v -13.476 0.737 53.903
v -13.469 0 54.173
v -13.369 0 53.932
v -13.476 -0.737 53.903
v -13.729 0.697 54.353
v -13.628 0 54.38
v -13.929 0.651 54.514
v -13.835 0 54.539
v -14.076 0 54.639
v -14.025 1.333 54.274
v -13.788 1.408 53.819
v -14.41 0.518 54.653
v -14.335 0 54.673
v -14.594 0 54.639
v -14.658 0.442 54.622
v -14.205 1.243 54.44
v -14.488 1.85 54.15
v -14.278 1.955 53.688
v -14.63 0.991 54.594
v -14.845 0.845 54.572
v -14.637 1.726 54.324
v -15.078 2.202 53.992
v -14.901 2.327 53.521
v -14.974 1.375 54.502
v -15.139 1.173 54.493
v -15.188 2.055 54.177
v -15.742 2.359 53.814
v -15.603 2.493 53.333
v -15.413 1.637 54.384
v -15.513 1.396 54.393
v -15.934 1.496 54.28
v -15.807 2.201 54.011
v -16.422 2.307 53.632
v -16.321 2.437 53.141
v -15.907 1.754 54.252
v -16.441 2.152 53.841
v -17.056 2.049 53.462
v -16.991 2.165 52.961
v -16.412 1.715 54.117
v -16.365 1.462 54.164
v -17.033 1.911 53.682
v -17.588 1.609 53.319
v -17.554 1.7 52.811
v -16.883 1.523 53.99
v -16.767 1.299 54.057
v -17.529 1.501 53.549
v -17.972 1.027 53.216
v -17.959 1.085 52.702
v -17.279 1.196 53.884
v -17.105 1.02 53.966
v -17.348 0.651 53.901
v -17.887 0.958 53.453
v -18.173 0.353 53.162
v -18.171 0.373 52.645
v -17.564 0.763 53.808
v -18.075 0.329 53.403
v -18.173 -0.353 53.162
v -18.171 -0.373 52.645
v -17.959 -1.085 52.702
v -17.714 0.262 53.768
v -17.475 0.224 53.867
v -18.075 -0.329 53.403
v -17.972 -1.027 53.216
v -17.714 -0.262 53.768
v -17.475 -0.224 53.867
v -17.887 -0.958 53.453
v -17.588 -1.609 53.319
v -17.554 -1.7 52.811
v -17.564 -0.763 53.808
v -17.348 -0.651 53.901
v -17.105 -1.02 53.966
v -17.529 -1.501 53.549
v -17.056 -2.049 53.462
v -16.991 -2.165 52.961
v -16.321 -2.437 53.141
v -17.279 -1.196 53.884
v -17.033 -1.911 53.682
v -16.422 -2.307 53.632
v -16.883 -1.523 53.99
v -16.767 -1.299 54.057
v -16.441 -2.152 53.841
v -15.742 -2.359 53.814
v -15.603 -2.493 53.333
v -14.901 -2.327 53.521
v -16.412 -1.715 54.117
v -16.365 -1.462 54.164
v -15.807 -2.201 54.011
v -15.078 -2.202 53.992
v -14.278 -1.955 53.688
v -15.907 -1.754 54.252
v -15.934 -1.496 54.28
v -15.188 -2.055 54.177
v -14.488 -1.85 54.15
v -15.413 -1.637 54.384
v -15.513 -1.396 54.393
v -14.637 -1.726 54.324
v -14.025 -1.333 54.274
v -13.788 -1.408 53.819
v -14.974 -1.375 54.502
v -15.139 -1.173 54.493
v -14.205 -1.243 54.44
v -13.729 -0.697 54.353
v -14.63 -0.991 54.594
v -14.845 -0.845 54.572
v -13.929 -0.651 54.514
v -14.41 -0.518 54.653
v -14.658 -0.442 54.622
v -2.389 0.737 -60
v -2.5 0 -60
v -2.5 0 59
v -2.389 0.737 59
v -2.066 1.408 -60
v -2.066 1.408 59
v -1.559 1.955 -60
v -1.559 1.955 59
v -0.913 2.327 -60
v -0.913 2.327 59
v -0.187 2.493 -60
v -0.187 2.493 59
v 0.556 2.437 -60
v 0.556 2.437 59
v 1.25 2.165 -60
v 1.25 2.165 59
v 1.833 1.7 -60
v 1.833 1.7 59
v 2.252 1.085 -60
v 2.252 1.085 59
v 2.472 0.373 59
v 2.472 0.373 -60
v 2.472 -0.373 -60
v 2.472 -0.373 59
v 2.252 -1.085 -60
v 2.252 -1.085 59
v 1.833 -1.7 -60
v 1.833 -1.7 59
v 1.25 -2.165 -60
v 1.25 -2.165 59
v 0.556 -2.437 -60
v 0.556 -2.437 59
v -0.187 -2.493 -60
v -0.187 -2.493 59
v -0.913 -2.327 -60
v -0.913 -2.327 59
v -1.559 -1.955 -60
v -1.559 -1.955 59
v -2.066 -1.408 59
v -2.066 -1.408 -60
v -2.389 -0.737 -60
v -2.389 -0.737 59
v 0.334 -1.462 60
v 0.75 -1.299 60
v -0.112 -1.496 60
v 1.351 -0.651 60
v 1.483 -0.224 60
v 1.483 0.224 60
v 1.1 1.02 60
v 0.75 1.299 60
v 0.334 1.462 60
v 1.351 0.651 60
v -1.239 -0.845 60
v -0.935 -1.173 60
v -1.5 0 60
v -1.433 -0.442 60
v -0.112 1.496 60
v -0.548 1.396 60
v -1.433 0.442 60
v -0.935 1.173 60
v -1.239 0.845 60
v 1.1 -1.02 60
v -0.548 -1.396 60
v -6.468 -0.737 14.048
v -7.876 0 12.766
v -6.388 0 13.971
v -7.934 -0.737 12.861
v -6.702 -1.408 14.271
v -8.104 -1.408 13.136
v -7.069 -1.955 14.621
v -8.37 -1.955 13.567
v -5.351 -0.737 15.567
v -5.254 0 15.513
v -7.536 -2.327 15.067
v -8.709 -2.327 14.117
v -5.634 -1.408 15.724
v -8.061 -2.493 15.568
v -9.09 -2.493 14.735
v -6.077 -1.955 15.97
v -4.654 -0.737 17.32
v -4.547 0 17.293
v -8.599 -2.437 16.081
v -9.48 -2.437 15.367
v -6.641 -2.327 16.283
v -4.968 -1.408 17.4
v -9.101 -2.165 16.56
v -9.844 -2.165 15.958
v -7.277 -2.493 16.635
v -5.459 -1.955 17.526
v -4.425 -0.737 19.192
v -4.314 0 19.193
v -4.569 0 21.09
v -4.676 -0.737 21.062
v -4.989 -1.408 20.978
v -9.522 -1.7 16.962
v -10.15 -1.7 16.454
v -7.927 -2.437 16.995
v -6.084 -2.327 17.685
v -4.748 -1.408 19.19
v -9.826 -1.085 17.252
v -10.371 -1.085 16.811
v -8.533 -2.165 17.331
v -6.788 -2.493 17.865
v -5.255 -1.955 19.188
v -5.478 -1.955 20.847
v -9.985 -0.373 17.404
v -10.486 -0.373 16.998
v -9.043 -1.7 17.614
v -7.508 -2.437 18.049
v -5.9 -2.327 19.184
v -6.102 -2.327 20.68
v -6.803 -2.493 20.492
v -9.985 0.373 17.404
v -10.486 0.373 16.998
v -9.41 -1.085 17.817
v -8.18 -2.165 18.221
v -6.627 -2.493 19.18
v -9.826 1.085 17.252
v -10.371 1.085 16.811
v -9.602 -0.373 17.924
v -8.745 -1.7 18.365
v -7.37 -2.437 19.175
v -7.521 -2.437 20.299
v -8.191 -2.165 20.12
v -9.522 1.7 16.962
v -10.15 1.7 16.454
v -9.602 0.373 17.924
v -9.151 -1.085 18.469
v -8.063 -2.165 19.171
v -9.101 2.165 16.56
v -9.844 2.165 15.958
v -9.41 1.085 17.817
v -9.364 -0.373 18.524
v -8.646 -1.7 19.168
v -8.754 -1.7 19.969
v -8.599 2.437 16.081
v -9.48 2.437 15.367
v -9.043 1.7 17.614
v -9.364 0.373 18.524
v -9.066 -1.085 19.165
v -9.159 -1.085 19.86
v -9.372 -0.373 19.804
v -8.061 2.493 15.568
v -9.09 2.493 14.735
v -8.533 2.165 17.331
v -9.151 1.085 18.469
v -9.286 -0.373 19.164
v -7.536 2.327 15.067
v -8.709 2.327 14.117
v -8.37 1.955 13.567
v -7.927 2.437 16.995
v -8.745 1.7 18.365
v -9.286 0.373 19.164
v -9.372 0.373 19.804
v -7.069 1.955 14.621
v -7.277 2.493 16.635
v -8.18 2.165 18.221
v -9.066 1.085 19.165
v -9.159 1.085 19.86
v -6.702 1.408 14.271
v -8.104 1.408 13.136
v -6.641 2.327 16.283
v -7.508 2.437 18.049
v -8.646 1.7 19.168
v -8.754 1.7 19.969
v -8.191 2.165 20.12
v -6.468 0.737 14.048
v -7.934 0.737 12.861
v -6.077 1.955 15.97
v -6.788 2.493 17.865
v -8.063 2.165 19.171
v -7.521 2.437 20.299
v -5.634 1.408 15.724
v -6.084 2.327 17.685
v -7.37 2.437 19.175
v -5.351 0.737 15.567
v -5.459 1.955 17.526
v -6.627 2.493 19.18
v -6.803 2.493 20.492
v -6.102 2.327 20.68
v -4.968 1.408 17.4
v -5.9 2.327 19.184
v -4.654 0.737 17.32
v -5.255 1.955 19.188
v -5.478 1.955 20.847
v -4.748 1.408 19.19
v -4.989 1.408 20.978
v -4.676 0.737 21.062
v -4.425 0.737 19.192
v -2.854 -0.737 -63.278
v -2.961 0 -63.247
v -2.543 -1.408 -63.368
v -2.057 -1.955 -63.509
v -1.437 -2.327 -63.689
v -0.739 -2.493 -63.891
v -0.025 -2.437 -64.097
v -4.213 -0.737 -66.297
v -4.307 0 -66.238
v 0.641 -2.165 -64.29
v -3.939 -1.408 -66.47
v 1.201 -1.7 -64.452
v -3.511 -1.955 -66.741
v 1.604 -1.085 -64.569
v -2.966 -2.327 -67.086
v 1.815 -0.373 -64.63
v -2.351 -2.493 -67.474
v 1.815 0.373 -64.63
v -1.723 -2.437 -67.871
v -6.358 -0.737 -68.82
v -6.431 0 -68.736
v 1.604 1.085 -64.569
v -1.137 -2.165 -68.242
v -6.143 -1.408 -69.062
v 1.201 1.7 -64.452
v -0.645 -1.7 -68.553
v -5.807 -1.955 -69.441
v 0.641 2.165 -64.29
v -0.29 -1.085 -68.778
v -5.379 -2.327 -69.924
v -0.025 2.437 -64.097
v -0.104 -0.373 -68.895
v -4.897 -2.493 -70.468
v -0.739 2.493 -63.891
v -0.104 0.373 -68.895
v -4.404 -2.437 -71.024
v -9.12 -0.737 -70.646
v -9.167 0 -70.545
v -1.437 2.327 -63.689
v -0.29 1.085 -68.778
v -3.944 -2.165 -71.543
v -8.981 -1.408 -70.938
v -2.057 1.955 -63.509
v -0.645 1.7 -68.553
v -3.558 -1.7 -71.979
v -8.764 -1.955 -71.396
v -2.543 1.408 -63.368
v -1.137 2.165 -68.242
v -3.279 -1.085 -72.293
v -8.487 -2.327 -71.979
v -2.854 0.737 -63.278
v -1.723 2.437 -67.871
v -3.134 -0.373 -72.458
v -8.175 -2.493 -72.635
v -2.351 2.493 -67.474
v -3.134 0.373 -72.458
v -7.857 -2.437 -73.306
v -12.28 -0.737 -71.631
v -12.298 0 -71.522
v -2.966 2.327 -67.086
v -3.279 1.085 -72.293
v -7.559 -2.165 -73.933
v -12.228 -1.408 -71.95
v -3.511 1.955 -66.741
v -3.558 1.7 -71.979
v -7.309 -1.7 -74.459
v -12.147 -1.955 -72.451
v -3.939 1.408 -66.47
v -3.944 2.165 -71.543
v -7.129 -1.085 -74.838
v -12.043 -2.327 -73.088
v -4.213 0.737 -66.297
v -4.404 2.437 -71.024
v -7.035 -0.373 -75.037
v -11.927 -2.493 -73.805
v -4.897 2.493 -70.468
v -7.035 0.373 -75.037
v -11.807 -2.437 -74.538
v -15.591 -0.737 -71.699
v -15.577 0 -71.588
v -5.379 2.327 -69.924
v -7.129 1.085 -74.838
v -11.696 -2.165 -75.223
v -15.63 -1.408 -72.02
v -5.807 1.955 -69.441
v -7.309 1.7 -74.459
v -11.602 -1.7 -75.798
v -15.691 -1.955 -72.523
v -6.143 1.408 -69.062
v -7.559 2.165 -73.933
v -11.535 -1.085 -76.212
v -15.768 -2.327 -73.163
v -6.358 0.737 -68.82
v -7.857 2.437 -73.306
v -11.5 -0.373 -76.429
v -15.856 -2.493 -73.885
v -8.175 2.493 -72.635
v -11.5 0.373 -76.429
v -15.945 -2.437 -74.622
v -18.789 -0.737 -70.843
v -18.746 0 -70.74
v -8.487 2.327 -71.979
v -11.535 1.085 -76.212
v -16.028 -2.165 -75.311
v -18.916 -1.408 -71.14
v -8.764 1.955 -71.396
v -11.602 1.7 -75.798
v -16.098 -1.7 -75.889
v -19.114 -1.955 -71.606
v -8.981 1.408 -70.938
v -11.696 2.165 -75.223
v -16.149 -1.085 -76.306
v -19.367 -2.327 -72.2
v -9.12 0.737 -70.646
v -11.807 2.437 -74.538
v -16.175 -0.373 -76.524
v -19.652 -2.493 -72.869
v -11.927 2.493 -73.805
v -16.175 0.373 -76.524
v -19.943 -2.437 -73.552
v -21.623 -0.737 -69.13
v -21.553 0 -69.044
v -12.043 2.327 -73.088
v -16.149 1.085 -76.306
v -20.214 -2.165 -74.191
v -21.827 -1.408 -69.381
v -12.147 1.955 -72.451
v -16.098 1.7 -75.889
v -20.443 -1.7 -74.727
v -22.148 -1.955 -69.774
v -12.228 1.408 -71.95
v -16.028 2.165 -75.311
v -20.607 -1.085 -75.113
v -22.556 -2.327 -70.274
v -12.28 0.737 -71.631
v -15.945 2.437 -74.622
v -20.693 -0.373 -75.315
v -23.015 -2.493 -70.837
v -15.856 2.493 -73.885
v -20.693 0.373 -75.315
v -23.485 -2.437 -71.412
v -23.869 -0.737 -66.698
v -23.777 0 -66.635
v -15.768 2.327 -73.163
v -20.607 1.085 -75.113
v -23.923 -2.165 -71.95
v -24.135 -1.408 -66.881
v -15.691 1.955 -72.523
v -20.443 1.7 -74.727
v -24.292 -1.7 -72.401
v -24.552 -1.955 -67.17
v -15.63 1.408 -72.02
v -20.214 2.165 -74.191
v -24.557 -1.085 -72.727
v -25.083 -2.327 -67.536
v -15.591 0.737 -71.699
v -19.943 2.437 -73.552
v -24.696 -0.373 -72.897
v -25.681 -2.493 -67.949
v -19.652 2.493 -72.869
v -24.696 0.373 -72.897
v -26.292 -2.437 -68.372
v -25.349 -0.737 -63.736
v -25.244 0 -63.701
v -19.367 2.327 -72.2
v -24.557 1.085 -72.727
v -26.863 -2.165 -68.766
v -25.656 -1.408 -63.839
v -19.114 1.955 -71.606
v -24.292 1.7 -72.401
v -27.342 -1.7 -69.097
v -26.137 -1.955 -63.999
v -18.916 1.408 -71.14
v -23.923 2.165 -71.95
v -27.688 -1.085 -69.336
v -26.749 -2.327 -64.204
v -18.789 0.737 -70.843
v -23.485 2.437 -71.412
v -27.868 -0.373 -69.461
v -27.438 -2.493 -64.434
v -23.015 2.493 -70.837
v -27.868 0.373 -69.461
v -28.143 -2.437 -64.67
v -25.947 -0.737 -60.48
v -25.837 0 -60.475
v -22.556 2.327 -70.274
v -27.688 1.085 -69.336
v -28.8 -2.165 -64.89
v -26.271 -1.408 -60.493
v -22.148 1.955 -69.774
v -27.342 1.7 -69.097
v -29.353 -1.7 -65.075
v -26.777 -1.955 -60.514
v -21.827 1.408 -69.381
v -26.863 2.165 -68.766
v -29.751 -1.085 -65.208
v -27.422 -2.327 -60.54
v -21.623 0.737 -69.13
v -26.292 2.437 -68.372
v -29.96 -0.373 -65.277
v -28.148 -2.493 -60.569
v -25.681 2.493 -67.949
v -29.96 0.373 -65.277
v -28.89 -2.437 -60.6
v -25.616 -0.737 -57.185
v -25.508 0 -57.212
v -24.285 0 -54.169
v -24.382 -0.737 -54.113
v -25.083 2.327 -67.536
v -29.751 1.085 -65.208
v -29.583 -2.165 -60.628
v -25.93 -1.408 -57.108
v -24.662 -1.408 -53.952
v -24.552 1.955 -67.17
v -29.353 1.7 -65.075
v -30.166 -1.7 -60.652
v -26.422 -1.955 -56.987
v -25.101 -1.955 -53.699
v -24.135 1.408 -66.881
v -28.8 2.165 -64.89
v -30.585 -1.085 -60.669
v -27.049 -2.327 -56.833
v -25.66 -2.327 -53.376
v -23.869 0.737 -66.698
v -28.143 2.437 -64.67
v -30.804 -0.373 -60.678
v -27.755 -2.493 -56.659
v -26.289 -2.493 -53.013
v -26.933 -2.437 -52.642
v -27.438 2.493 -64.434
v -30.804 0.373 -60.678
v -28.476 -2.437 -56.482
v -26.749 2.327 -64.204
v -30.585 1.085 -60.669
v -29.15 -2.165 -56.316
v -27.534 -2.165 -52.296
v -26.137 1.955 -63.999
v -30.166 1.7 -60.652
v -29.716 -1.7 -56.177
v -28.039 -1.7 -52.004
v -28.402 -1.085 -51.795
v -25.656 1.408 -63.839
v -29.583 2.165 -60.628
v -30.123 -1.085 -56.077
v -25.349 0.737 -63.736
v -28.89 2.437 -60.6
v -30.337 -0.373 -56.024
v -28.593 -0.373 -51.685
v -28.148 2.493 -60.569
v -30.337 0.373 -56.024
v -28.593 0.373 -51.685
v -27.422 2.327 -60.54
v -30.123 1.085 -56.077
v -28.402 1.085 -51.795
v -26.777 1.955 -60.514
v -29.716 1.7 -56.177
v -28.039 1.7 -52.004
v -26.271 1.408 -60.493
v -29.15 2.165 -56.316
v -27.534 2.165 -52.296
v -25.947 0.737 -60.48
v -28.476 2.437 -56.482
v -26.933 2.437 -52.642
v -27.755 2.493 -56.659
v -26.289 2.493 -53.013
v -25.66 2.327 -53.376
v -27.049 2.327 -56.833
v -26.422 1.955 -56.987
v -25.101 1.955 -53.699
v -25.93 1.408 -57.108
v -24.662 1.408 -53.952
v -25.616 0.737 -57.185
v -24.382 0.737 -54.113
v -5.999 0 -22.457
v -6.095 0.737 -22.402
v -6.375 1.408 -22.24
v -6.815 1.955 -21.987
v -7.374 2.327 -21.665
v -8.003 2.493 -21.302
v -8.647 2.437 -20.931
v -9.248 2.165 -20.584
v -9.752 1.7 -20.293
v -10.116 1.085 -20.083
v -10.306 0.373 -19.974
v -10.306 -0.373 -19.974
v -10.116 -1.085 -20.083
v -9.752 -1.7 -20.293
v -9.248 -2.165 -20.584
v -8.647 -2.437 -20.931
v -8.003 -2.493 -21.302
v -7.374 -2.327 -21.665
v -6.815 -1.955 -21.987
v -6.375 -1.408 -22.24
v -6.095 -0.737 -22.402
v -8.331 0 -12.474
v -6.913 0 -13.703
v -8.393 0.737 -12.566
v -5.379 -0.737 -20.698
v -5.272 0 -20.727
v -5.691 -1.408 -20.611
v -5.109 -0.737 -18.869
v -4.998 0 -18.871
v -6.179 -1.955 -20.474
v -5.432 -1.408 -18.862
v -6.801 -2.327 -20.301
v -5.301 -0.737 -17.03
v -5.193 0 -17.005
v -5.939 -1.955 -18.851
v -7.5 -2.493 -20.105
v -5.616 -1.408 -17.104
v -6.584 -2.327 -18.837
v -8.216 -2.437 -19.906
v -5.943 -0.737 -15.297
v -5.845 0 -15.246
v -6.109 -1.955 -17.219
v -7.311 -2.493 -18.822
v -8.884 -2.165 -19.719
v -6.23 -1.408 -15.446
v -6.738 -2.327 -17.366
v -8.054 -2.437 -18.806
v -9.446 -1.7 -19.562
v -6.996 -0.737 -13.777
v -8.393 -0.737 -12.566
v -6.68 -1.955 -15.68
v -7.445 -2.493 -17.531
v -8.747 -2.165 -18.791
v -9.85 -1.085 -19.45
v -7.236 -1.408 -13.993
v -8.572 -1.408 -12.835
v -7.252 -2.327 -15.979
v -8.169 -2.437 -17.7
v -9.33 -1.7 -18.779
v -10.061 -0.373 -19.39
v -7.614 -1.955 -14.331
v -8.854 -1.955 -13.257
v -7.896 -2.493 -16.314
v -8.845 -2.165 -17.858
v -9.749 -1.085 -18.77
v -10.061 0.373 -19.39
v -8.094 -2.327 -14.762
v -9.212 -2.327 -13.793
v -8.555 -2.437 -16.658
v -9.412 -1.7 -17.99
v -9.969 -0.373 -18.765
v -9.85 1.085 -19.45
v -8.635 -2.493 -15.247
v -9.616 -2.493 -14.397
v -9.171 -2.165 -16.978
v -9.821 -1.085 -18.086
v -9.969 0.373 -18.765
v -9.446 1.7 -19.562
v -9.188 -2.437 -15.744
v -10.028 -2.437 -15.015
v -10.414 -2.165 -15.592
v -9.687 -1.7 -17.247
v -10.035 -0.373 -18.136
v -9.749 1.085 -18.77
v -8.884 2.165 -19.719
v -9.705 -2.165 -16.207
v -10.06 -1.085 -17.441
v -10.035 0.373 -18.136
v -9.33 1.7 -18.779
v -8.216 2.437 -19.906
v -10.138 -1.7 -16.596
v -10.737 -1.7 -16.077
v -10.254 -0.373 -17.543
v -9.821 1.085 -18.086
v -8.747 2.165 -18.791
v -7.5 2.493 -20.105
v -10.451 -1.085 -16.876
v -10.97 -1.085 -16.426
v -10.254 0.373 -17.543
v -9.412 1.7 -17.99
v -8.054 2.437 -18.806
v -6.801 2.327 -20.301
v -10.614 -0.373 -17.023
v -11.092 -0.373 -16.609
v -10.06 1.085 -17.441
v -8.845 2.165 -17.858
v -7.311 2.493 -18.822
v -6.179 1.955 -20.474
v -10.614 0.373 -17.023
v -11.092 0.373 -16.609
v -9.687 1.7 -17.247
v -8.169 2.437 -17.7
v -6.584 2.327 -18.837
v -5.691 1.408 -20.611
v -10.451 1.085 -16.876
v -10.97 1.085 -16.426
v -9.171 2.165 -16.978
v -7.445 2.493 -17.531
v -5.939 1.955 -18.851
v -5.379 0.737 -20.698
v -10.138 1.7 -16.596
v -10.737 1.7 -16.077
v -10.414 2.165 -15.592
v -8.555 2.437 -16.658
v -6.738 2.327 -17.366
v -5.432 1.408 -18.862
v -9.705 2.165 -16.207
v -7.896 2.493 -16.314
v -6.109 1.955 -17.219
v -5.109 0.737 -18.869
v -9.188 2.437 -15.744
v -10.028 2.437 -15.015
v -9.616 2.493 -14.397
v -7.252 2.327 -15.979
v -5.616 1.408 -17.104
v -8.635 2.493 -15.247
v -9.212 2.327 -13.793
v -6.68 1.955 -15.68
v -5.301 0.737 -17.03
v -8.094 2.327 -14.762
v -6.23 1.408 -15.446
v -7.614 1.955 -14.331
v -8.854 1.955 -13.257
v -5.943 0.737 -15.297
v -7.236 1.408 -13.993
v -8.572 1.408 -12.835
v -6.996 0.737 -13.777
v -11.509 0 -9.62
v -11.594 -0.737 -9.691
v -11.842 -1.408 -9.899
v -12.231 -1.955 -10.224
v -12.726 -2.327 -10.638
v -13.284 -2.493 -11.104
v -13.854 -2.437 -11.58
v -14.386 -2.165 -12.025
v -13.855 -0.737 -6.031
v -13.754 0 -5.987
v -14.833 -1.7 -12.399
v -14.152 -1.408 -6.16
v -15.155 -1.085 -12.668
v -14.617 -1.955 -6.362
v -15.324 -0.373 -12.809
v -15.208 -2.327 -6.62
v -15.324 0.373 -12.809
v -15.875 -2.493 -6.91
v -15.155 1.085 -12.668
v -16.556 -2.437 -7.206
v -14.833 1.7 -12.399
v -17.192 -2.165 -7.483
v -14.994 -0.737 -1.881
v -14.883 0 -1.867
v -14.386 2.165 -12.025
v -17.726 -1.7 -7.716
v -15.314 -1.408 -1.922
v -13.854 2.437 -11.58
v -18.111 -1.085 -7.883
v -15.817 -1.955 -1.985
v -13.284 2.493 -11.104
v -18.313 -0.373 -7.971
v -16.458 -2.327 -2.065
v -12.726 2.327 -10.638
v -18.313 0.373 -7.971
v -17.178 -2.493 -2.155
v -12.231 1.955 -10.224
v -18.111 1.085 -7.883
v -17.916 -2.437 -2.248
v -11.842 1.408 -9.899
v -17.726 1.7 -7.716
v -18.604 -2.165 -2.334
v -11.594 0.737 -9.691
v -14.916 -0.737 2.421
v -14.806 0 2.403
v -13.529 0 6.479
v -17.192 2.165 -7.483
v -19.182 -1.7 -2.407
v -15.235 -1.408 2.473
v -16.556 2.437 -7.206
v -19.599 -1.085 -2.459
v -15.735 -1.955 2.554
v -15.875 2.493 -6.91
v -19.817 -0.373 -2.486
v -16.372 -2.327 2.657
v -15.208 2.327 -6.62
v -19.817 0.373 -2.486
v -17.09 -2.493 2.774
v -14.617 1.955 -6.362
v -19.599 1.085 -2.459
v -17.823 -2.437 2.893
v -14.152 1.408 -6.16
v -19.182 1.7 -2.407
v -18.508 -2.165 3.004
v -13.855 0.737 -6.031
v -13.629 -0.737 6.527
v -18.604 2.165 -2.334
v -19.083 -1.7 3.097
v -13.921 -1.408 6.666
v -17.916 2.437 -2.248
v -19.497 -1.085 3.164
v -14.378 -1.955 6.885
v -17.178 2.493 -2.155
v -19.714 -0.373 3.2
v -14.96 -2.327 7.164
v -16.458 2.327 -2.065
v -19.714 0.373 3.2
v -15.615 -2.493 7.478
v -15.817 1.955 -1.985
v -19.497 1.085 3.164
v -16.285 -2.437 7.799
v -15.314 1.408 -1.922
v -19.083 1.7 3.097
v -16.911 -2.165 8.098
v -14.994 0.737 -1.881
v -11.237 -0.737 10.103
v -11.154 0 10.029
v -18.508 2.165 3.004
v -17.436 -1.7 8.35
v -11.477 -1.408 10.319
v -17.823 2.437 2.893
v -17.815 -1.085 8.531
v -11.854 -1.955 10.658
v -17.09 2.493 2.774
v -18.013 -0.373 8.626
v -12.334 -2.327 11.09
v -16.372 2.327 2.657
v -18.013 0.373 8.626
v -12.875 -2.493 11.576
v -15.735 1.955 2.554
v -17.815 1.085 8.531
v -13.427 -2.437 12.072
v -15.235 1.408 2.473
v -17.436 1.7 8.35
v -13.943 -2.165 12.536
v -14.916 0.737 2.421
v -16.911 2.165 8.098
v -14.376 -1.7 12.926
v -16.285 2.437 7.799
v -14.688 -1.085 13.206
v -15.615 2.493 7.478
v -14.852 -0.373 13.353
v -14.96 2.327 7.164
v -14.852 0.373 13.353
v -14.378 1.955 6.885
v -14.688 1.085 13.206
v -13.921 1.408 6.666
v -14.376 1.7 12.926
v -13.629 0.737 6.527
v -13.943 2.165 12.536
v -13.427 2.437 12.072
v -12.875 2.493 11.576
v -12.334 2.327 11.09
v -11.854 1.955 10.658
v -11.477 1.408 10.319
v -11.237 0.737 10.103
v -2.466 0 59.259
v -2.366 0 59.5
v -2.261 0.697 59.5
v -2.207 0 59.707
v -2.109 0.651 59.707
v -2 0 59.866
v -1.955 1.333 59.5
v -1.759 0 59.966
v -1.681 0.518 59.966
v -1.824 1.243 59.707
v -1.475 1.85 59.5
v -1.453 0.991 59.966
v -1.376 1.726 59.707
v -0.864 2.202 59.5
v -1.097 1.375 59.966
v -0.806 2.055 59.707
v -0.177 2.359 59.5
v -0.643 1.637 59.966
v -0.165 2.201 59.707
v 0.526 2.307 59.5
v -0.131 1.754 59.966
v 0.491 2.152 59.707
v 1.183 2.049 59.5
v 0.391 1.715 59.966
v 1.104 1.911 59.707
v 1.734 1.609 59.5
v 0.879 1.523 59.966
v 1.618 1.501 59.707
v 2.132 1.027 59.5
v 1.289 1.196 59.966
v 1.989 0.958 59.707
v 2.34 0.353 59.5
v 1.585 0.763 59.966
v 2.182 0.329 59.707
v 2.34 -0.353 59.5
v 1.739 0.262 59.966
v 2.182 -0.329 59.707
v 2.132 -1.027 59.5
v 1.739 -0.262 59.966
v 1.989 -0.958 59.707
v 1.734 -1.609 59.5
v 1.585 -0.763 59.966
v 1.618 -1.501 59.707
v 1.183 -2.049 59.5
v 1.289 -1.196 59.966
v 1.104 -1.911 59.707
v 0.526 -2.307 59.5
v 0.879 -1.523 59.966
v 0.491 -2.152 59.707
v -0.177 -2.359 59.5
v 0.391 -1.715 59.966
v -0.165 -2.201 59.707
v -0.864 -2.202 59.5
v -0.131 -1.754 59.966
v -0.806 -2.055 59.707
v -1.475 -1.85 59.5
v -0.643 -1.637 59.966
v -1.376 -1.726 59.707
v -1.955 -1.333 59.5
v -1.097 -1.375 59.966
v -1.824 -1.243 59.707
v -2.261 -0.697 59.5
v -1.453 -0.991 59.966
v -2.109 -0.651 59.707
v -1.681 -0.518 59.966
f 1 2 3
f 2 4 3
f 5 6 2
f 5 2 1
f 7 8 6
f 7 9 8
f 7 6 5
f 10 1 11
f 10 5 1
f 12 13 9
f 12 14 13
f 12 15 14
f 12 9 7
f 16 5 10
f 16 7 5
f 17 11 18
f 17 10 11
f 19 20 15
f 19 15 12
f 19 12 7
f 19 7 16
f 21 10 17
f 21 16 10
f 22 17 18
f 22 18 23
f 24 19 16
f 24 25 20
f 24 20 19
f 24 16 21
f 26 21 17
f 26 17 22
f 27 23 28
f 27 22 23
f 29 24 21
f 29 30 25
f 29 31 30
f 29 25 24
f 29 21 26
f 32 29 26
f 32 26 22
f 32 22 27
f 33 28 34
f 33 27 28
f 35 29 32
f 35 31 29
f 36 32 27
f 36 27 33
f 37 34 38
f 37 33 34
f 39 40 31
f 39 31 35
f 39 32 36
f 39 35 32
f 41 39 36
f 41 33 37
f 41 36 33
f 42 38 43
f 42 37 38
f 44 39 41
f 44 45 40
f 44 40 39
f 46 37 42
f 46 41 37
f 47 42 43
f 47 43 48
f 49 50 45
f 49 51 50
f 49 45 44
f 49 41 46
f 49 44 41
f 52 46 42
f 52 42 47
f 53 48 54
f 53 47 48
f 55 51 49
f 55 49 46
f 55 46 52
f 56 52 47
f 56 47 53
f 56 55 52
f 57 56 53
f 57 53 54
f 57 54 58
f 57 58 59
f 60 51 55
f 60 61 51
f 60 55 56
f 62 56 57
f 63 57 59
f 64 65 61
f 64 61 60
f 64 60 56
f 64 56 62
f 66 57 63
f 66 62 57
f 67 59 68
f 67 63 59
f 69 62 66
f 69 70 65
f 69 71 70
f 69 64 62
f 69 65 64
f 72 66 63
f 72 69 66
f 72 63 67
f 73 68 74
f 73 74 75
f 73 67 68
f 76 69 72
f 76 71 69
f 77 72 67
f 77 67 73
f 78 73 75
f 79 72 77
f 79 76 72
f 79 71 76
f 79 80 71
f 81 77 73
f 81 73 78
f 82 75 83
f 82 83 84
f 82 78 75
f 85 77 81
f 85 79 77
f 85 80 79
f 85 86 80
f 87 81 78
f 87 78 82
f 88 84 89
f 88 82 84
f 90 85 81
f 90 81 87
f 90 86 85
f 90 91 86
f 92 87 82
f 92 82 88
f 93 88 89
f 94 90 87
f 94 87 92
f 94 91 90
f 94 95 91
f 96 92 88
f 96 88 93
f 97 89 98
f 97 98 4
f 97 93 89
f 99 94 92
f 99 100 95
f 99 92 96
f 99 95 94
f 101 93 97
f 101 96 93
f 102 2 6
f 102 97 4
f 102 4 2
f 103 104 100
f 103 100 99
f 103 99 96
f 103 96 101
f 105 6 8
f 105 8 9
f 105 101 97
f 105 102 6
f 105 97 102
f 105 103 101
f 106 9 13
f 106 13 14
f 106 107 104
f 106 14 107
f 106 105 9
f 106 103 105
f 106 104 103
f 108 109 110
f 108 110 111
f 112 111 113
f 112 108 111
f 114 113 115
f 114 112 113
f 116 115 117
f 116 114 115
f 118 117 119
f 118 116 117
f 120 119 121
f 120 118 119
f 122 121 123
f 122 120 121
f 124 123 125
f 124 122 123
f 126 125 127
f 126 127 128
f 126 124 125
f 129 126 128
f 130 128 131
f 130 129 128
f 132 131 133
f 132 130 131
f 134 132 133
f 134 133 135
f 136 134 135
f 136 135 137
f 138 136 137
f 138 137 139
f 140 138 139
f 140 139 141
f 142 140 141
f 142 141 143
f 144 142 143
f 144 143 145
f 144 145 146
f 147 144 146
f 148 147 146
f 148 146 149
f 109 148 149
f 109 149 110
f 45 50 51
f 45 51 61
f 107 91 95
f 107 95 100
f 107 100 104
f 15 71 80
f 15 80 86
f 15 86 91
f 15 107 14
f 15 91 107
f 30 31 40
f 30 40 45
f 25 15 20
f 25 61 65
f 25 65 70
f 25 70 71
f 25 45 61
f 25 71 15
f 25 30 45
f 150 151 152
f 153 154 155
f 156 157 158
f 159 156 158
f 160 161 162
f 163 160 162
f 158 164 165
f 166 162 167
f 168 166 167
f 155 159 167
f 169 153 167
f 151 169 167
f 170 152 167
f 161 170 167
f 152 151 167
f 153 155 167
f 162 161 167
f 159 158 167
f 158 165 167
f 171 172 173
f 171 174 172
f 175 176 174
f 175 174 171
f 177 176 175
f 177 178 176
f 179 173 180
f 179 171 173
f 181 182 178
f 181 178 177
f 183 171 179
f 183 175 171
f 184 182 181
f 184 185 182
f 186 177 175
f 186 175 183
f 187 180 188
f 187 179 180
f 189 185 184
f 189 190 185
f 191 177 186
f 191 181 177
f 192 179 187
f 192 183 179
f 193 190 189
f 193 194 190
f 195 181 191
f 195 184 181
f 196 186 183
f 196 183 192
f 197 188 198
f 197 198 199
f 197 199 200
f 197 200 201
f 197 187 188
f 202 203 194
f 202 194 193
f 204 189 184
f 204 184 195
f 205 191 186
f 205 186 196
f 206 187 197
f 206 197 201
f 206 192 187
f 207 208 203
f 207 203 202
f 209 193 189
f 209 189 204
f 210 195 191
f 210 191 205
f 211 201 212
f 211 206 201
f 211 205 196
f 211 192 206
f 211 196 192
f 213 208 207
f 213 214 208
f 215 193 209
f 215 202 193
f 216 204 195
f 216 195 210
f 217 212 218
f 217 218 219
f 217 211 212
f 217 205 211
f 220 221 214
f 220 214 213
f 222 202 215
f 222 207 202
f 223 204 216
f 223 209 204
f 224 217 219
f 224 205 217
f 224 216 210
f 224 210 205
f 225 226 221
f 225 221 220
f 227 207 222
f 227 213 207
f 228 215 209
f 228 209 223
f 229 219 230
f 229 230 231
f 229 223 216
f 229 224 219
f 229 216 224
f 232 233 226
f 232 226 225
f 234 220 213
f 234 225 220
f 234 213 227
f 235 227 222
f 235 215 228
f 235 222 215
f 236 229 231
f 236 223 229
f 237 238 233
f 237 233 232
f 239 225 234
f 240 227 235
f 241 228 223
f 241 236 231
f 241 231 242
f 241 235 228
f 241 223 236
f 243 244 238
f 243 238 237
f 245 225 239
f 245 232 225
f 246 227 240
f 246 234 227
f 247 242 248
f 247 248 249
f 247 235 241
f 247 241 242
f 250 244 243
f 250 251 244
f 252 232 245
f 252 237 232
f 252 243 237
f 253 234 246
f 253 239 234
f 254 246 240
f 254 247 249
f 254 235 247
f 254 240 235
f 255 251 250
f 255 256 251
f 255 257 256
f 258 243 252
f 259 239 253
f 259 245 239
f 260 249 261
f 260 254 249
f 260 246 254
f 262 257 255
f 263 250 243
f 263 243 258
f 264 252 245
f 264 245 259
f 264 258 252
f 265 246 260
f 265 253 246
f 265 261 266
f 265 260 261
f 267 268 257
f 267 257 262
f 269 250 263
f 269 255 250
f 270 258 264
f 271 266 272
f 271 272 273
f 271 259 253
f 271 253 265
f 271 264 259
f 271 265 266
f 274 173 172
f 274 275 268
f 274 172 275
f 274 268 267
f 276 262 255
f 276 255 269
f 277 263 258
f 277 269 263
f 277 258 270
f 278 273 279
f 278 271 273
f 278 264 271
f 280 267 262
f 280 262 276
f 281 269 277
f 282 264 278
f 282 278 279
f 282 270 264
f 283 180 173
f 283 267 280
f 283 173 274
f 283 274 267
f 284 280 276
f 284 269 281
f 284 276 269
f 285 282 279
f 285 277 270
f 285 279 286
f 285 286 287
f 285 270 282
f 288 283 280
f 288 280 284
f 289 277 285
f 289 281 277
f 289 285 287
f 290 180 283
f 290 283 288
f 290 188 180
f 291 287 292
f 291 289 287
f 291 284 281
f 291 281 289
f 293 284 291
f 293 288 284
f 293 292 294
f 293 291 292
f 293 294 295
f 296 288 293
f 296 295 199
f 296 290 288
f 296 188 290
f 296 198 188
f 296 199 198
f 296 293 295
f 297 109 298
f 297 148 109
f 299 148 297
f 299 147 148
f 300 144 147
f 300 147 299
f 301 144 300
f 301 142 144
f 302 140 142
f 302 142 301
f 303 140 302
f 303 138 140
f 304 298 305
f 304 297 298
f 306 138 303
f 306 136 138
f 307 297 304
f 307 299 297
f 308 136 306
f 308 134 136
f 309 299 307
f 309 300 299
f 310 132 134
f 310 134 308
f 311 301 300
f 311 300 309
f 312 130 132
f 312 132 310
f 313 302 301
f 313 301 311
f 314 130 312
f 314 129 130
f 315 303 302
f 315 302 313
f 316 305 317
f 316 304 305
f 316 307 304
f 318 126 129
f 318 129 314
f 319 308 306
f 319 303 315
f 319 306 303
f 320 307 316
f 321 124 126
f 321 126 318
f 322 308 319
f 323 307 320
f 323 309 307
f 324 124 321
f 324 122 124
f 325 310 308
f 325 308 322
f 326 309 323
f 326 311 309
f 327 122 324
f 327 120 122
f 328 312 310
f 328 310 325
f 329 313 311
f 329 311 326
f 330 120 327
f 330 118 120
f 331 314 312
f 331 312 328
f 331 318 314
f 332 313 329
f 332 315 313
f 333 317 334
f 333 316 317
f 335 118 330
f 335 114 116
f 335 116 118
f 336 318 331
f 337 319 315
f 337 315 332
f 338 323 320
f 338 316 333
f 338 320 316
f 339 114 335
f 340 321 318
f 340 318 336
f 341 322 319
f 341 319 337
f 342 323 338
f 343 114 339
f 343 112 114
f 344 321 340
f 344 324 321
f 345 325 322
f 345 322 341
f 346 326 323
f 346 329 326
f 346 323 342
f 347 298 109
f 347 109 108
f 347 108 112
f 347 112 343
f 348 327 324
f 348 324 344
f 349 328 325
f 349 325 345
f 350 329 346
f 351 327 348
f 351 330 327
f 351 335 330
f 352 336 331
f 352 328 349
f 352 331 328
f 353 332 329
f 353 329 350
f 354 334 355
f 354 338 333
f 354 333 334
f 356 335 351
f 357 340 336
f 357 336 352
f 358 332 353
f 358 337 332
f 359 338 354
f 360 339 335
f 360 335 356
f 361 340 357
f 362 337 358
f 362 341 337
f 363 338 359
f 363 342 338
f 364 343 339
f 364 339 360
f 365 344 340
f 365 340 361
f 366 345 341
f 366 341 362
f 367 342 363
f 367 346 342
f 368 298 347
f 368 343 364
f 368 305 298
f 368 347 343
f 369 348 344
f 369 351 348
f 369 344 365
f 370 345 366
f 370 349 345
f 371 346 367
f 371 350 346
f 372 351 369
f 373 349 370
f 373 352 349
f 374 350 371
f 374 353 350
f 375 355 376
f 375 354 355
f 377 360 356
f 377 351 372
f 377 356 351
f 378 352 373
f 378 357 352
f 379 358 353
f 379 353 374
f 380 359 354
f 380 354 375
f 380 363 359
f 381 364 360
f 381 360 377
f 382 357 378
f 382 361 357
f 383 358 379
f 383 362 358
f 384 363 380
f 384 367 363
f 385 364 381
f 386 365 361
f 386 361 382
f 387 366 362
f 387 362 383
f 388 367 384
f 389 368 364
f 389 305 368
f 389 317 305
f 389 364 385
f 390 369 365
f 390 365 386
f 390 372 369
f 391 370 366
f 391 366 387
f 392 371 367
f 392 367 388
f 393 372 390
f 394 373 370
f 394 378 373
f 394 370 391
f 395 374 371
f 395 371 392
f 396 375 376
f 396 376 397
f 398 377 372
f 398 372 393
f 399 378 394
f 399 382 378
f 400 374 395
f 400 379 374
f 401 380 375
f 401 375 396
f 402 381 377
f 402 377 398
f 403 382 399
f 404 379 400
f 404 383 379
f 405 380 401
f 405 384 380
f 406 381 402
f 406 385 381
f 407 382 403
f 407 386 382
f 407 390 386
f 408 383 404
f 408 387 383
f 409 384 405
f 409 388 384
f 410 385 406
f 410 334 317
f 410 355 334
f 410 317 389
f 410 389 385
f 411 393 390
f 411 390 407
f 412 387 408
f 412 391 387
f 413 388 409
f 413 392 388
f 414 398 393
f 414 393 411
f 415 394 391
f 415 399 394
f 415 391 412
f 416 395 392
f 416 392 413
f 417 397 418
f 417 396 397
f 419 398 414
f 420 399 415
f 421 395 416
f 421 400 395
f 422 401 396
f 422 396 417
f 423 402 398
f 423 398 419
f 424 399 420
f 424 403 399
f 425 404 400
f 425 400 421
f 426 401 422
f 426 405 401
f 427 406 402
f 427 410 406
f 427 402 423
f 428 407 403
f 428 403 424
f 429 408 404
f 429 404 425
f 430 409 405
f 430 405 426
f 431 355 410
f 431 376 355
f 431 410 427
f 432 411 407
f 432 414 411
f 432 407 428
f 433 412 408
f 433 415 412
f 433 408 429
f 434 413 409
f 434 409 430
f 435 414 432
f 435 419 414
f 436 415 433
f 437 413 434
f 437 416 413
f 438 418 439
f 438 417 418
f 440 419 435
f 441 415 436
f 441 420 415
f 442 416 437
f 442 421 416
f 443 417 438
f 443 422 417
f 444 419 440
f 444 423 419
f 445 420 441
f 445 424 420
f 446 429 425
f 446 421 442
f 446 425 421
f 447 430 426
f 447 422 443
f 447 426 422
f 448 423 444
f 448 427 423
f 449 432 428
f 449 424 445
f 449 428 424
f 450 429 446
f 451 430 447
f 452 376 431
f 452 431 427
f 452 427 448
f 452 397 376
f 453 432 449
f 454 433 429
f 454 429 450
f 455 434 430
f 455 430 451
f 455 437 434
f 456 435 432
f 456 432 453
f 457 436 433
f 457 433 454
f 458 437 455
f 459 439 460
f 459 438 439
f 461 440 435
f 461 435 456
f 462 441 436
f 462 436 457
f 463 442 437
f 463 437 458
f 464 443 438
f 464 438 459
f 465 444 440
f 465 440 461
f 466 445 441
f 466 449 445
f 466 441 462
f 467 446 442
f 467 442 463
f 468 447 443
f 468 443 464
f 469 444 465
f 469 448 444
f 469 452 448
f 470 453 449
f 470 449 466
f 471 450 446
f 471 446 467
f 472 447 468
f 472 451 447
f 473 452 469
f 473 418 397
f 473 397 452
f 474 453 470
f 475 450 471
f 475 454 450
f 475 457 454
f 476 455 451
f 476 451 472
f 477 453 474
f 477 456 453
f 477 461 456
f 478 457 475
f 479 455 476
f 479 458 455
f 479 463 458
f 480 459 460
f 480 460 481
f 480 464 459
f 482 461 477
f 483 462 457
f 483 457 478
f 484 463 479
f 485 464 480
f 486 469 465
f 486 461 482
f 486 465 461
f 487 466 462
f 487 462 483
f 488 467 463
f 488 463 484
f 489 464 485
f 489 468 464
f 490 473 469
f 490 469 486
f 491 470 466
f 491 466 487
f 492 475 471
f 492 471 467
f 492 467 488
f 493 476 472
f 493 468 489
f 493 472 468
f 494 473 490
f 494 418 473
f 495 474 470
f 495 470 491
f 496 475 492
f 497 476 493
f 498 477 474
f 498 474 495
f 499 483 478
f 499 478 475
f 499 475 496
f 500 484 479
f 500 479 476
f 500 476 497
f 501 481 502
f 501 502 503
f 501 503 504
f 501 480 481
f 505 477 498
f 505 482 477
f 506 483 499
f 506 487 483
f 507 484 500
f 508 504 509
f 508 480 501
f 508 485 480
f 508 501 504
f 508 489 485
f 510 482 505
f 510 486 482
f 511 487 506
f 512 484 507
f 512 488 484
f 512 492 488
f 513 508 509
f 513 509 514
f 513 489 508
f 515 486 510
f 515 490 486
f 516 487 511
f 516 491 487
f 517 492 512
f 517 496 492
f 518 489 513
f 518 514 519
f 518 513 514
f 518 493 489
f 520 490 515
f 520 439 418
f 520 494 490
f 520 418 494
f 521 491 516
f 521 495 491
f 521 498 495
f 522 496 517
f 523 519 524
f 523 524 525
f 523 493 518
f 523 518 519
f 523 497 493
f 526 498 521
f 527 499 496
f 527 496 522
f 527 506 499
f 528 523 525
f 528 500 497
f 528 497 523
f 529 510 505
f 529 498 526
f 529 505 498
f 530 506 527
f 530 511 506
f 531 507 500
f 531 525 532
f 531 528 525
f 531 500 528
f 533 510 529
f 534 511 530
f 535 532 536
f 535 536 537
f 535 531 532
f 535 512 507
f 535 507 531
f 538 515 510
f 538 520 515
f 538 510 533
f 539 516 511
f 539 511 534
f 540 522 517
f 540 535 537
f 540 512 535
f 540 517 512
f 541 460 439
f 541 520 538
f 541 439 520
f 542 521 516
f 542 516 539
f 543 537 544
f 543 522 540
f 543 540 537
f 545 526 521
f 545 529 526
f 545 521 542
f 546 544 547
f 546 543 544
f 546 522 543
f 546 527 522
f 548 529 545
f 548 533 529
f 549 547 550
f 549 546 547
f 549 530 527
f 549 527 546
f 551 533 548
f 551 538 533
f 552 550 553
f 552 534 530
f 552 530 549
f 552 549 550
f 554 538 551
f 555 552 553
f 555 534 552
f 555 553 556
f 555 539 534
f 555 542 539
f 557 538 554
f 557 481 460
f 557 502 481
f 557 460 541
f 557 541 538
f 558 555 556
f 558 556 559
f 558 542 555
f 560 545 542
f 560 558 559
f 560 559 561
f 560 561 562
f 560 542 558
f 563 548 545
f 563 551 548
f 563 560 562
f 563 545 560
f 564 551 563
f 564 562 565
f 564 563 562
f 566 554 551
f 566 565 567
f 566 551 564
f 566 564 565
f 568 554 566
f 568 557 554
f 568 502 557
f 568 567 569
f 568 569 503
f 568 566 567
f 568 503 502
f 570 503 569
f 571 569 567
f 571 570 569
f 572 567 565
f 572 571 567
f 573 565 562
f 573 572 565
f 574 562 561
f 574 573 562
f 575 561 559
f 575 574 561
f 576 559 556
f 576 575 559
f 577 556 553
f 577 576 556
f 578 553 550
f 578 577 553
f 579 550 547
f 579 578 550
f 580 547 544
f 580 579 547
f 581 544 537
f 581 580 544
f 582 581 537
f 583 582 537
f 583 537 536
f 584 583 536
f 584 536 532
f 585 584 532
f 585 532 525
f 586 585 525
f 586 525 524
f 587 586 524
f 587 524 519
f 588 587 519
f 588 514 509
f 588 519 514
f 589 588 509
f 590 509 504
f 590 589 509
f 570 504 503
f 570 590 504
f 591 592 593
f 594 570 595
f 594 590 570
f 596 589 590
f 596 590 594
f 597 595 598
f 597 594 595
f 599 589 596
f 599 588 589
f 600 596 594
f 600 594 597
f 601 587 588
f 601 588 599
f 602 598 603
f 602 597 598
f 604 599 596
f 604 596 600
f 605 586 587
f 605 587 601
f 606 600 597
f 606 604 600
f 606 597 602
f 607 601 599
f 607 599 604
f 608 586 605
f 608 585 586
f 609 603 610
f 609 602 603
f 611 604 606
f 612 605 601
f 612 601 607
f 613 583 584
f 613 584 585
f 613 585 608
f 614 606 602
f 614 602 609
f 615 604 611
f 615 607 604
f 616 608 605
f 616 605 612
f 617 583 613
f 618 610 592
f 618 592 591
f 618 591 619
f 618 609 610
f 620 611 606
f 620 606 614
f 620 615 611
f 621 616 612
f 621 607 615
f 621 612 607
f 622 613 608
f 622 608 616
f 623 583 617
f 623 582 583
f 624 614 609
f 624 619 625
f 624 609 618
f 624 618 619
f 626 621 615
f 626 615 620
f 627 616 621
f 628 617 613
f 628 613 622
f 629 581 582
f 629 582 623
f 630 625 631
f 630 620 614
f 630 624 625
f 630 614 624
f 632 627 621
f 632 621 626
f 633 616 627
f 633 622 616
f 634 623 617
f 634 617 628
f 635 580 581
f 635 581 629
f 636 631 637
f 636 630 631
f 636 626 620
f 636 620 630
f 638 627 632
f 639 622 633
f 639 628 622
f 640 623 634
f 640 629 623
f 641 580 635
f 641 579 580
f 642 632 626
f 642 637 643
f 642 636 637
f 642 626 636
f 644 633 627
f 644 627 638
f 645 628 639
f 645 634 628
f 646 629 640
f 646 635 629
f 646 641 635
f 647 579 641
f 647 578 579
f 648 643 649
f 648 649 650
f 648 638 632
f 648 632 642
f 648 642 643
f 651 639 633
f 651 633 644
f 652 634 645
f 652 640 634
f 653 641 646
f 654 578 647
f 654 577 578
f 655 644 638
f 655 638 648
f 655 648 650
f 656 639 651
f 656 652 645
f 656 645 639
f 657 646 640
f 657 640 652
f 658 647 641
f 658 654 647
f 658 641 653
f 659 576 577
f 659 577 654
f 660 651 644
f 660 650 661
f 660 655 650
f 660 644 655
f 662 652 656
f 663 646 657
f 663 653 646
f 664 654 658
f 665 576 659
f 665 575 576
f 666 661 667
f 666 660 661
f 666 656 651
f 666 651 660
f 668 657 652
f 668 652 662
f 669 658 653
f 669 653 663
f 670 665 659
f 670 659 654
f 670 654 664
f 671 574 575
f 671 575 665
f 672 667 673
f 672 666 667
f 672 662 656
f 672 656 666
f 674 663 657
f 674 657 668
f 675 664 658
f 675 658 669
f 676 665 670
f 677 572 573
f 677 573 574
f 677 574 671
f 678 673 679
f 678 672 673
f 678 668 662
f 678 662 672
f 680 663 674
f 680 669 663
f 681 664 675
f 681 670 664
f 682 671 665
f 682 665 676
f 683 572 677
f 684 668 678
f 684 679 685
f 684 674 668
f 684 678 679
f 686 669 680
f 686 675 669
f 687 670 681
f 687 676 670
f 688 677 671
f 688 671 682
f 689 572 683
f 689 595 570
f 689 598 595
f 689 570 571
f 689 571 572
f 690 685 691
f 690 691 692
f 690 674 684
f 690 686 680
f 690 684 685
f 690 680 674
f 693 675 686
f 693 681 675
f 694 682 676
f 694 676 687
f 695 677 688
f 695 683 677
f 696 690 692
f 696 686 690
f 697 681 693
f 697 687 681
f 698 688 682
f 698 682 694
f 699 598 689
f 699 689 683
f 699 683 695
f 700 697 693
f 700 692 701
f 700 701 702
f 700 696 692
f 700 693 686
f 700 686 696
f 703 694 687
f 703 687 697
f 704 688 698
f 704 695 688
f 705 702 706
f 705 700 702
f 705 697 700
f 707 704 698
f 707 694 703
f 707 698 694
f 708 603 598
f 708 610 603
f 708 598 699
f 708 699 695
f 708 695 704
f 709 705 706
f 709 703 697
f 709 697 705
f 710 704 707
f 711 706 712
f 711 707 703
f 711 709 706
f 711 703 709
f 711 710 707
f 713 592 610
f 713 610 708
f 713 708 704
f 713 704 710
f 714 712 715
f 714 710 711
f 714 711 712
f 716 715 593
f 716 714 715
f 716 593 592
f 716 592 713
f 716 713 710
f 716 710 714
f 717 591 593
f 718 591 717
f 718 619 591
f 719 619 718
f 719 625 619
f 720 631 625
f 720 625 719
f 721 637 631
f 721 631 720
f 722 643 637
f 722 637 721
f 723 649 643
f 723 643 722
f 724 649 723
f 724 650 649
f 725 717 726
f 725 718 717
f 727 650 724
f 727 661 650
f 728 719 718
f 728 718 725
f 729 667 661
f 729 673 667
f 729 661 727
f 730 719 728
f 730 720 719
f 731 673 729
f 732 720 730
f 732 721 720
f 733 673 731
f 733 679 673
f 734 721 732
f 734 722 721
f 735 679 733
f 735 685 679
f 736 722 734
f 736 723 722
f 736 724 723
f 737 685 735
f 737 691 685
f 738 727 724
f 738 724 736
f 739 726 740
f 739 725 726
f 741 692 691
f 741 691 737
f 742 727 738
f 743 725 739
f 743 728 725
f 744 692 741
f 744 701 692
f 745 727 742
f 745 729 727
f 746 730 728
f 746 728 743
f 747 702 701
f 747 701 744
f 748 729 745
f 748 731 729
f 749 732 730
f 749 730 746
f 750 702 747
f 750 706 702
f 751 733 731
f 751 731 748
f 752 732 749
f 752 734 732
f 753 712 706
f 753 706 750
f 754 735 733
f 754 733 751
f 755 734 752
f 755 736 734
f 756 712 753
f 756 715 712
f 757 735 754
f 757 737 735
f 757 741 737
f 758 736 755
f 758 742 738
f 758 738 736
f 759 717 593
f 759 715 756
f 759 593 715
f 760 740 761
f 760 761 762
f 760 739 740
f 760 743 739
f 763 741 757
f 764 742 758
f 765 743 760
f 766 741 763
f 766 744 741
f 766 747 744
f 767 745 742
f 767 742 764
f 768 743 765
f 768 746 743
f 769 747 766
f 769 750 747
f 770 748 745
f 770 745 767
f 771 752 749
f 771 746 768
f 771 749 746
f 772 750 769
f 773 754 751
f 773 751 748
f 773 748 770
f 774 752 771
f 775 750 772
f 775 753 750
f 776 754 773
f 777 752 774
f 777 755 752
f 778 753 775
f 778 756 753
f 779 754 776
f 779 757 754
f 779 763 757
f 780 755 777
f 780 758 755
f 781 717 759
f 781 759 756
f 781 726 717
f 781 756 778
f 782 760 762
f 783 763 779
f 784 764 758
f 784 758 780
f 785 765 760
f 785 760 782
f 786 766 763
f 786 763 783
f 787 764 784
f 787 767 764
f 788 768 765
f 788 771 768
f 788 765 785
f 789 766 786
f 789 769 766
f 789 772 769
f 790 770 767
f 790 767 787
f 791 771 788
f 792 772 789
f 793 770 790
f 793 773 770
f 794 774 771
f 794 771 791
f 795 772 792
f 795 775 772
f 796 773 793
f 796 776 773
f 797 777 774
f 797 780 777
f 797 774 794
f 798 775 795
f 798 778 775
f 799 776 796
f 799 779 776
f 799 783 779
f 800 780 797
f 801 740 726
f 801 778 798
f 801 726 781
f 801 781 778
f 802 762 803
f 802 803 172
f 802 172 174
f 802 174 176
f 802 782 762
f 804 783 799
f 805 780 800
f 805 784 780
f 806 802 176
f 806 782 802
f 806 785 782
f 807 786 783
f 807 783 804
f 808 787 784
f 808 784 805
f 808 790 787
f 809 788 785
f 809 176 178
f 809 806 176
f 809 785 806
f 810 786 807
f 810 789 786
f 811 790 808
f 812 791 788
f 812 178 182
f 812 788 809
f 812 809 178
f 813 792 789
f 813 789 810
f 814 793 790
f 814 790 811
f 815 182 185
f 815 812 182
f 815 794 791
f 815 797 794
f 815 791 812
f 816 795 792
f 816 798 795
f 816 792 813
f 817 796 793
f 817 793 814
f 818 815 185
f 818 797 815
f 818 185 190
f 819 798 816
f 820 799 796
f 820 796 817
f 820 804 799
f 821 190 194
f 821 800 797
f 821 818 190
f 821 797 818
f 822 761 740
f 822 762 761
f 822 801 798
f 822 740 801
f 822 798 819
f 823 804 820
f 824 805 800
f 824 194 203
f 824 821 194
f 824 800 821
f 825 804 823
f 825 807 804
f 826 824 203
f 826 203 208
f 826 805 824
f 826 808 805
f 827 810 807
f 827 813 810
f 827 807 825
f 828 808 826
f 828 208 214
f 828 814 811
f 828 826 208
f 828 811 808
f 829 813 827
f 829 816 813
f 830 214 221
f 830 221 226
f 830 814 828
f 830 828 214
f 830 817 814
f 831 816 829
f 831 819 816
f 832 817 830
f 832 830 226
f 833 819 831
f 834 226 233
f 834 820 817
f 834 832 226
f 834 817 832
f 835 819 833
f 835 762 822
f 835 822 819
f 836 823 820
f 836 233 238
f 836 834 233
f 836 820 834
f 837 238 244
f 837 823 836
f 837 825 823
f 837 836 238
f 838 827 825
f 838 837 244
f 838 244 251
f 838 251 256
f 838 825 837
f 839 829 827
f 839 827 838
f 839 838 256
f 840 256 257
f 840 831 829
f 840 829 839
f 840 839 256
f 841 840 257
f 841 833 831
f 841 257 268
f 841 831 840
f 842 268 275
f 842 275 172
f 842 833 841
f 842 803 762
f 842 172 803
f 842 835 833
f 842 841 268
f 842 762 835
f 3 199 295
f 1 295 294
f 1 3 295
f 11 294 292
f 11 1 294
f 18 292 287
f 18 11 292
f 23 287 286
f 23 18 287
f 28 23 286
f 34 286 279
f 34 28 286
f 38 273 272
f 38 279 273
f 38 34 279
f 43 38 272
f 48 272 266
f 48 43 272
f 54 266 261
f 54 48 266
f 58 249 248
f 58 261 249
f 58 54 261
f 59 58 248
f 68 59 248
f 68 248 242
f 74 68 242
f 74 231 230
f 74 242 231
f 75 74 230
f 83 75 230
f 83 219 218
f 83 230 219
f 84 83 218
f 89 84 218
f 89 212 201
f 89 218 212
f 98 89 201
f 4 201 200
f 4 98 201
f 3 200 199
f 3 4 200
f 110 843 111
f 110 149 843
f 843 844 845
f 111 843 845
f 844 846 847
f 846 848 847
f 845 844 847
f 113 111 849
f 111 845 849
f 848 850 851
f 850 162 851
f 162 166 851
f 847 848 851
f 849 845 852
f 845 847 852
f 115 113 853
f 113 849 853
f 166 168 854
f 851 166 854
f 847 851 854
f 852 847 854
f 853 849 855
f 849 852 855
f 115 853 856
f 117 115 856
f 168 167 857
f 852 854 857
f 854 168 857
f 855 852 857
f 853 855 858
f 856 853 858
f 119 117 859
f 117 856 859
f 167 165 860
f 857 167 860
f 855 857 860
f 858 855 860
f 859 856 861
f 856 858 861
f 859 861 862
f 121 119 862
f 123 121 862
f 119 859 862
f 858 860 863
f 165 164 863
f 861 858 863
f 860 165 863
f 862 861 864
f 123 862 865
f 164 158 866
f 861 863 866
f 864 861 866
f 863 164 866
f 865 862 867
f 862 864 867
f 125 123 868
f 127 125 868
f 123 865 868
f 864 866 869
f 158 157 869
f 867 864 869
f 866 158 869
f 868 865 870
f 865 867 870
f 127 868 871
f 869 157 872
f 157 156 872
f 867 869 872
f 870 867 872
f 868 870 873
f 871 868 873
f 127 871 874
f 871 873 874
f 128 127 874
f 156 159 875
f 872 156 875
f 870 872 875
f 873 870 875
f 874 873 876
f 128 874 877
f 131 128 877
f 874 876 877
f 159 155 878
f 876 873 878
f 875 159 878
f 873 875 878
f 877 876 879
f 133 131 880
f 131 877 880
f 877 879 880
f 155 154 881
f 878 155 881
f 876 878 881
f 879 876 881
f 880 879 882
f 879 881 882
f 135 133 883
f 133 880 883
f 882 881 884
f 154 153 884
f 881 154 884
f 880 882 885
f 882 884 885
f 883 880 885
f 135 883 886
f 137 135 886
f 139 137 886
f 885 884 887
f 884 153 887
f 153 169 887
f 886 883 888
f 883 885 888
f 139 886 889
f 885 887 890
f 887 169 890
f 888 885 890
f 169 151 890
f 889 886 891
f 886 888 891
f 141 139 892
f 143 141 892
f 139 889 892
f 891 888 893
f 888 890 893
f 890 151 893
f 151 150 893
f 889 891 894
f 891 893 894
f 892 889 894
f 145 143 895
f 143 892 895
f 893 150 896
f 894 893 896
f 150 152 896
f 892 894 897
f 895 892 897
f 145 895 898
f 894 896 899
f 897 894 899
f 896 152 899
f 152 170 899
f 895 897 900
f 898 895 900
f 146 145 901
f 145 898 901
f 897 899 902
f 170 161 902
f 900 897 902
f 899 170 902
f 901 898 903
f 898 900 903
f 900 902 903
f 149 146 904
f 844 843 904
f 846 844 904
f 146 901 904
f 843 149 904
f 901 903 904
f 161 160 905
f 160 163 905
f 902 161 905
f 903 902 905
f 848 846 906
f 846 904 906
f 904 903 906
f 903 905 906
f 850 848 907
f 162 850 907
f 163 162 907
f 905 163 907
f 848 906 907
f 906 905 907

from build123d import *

# Parameters (mm, degrees)
SKETCH2_R = 2.5
FILLET1_R = 1


with BuildPart() as part:
    # Sweep2: sweep along a path in Sketch1
    with BuildLine(Plane(origin=(0, 0, 0), x_dir=(1, 0, 0), z_dir=(0, 1, 0))) as sweep2_path:
        Line((0, -60), (0, 60))
        ThreePointArc((0, 60), (-17.83774349, 73.691126094), (-26.451096024, 52.919939689))
        Line((-26.451096024, 52.919939689), (-8.164818455, 21.208493014))
        ThreePointArc((-8.164818455, 21.208493014), (-7.627304585, 17.573584756), (-9.719317887, 14.552829959))
        ThreePointArc((-9.719317887, 14.552829959), (-17.497154023, -0.31559641), (-9.188187443, -14.893864895))
        ThreePointArc((-9.188187443, -14.893864895), (-7.166578236, -17.303395297), (-6.983754723, -20.443350091))
        Line((-6.983754723, -20.443350091), (-16.042421302, -54.250754011))
    # Sketch2 → Sweep2 (sweep)
    with BuildSketch(Plane(origin=(0, 0, 60), x_dir=(-1, 0, 0), z_dir=(0, 0, -1))):
        Circle(SKETCH2_R)
    sweep(path=sweep2_path.line)

    # Fillet1
    fillet1_edges = [part.edges().sort_by_distance(p)[0] for p in [
        (-18.457235868, 0, 53.603706398),
        (2.5, 0, 60),
    ]]
    fillet(fillet1_edges, radius=FILLET1_R)


solid = part.part
